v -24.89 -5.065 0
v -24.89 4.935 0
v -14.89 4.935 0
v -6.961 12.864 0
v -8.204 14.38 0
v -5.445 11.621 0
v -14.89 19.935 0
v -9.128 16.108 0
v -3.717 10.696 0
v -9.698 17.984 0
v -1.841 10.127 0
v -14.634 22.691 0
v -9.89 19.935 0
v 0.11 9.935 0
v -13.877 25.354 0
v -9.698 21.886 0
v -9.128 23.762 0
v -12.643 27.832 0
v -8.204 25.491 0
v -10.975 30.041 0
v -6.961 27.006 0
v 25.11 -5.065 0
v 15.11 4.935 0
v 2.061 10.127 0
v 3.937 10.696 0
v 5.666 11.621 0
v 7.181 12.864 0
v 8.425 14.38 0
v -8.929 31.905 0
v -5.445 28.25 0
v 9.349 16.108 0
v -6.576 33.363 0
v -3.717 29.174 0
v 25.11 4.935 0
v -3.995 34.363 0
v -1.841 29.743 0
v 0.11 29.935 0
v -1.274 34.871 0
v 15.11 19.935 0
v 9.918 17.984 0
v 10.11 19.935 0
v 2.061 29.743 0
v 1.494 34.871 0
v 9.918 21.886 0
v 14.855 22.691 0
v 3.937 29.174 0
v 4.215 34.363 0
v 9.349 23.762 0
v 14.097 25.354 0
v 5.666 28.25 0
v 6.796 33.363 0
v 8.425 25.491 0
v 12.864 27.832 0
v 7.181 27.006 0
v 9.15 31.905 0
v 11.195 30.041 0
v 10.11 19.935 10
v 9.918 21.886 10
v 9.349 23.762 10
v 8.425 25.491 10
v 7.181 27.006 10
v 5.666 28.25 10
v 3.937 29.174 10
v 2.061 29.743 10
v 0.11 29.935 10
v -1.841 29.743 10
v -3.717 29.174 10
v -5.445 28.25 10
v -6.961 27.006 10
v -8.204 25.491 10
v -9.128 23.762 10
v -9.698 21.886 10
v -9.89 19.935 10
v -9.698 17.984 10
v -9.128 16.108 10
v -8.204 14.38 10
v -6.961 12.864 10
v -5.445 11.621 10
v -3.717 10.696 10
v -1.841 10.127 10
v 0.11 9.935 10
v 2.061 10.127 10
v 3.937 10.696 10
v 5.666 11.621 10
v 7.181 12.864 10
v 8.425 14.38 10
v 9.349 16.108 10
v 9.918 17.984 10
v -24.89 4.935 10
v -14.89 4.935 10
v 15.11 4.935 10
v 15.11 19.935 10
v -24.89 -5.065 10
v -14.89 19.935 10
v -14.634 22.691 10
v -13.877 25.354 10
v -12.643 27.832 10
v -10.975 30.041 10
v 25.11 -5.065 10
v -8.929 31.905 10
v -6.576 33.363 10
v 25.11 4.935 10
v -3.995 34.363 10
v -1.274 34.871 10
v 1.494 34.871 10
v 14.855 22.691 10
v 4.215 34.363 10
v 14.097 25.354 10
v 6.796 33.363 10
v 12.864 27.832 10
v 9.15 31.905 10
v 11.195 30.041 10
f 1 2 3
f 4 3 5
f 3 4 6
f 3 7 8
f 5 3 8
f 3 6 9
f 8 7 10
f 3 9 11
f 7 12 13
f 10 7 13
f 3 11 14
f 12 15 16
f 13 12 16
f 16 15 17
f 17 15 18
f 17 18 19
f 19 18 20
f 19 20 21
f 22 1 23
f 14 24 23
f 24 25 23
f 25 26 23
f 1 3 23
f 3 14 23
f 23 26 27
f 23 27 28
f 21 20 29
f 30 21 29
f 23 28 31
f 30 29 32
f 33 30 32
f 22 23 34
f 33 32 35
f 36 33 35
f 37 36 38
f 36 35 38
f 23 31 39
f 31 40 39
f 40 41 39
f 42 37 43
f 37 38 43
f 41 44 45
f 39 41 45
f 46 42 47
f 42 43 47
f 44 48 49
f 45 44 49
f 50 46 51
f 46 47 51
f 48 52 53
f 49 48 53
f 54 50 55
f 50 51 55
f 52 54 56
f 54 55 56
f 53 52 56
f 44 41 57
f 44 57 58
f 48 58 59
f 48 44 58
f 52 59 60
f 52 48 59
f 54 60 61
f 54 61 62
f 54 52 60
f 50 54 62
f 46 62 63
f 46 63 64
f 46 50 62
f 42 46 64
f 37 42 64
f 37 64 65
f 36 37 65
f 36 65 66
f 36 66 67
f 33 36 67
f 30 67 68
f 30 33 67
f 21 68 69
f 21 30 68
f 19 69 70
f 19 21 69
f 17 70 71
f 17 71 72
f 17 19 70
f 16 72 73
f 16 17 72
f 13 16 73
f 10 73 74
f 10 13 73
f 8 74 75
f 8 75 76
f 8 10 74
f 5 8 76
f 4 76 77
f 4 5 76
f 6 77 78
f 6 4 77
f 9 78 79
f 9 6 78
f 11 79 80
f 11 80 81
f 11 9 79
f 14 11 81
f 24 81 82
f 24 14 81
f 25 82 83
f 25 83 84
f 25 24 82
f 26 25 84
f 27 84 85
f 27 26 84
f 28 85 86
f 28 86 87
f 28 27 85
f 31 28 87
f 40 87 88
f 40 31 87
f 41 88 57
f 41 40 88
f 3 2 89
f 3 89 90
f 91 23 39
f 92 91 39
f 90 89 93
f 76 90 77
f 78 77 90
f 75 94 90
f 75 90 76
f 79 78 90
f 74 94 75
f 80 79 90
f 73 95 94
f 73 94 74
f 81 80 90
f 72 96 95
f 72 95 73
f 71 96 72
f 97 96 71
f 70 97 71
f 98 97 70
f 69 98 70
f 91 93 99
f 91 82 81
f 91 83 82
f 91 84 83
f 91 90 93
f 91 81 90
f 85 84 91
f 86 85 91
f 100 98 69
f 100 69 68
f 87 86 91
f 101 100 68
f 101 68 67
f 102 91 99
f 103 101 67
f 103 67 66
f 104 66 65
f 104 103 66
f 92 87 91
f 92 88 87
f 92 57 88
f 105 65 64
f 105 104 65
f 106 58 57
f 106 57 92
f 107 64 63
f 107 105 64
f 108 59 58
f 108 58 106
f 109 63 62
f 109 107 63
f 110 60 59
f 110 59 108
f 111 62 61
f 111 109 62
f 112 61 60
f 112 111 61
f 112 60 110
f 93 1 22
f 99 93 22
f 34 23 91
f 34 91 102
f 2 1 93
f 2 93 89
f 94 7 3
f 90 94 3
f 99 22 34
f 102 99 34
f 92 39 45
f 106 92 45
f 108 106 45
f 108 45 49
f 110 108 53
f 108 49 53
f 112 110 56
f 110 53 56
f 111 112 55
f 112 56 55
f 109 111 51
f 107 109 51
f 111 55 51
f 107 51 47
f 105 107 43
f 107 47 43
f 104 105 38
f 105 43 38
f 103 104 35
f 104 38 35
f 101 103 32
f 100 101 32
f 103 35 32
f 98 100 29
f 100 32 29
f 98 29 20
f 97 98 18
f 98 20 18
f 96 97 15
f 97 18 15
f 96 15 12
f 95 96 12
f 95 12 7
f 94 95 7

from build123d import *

# Parameters (mm, degrees)
SKETCH1_R      = 10
SKETCH1_W      = 50
SKETCH1_H      = 10
EXTRUDE1_DEPTH = 10


with BuildPart() as part:
    # Sketch1 → Extrude1 (new body)
    # profile 1 of 2: a face of its own
    with BuildSketch(Plane.XY):
        with BuildLine():
            Line((-14.889688552, 19.935237795), (-14.889688552, 4.935237795))
            Line((-14.889688552, 4.935237795), (15.110311448, 4.935237795))
            Line((15.110311448, 4.935237795), (15.110311448, 19.935237795))
            ThreePointArc((15.110311448, 19.935237795), (0.110311448, 34.935237795), (-14.889688552, 19.935237795))
        make_face()
        with Locations((0.110311448, 19.935237795)):
            Circle(SKETCH1_R, mode=Mode.SUBTRACT)
    # profile 2 of 2: a face of its own
    with BuildSketch(Plane.XY):
        with Locations((0.110311448, -0.064762205)):
            Rectangle(SKETCH1_W, SKETCH1_H)
    extrude(amount=EXTRUDE1_DEPTH)


solid = part.part
